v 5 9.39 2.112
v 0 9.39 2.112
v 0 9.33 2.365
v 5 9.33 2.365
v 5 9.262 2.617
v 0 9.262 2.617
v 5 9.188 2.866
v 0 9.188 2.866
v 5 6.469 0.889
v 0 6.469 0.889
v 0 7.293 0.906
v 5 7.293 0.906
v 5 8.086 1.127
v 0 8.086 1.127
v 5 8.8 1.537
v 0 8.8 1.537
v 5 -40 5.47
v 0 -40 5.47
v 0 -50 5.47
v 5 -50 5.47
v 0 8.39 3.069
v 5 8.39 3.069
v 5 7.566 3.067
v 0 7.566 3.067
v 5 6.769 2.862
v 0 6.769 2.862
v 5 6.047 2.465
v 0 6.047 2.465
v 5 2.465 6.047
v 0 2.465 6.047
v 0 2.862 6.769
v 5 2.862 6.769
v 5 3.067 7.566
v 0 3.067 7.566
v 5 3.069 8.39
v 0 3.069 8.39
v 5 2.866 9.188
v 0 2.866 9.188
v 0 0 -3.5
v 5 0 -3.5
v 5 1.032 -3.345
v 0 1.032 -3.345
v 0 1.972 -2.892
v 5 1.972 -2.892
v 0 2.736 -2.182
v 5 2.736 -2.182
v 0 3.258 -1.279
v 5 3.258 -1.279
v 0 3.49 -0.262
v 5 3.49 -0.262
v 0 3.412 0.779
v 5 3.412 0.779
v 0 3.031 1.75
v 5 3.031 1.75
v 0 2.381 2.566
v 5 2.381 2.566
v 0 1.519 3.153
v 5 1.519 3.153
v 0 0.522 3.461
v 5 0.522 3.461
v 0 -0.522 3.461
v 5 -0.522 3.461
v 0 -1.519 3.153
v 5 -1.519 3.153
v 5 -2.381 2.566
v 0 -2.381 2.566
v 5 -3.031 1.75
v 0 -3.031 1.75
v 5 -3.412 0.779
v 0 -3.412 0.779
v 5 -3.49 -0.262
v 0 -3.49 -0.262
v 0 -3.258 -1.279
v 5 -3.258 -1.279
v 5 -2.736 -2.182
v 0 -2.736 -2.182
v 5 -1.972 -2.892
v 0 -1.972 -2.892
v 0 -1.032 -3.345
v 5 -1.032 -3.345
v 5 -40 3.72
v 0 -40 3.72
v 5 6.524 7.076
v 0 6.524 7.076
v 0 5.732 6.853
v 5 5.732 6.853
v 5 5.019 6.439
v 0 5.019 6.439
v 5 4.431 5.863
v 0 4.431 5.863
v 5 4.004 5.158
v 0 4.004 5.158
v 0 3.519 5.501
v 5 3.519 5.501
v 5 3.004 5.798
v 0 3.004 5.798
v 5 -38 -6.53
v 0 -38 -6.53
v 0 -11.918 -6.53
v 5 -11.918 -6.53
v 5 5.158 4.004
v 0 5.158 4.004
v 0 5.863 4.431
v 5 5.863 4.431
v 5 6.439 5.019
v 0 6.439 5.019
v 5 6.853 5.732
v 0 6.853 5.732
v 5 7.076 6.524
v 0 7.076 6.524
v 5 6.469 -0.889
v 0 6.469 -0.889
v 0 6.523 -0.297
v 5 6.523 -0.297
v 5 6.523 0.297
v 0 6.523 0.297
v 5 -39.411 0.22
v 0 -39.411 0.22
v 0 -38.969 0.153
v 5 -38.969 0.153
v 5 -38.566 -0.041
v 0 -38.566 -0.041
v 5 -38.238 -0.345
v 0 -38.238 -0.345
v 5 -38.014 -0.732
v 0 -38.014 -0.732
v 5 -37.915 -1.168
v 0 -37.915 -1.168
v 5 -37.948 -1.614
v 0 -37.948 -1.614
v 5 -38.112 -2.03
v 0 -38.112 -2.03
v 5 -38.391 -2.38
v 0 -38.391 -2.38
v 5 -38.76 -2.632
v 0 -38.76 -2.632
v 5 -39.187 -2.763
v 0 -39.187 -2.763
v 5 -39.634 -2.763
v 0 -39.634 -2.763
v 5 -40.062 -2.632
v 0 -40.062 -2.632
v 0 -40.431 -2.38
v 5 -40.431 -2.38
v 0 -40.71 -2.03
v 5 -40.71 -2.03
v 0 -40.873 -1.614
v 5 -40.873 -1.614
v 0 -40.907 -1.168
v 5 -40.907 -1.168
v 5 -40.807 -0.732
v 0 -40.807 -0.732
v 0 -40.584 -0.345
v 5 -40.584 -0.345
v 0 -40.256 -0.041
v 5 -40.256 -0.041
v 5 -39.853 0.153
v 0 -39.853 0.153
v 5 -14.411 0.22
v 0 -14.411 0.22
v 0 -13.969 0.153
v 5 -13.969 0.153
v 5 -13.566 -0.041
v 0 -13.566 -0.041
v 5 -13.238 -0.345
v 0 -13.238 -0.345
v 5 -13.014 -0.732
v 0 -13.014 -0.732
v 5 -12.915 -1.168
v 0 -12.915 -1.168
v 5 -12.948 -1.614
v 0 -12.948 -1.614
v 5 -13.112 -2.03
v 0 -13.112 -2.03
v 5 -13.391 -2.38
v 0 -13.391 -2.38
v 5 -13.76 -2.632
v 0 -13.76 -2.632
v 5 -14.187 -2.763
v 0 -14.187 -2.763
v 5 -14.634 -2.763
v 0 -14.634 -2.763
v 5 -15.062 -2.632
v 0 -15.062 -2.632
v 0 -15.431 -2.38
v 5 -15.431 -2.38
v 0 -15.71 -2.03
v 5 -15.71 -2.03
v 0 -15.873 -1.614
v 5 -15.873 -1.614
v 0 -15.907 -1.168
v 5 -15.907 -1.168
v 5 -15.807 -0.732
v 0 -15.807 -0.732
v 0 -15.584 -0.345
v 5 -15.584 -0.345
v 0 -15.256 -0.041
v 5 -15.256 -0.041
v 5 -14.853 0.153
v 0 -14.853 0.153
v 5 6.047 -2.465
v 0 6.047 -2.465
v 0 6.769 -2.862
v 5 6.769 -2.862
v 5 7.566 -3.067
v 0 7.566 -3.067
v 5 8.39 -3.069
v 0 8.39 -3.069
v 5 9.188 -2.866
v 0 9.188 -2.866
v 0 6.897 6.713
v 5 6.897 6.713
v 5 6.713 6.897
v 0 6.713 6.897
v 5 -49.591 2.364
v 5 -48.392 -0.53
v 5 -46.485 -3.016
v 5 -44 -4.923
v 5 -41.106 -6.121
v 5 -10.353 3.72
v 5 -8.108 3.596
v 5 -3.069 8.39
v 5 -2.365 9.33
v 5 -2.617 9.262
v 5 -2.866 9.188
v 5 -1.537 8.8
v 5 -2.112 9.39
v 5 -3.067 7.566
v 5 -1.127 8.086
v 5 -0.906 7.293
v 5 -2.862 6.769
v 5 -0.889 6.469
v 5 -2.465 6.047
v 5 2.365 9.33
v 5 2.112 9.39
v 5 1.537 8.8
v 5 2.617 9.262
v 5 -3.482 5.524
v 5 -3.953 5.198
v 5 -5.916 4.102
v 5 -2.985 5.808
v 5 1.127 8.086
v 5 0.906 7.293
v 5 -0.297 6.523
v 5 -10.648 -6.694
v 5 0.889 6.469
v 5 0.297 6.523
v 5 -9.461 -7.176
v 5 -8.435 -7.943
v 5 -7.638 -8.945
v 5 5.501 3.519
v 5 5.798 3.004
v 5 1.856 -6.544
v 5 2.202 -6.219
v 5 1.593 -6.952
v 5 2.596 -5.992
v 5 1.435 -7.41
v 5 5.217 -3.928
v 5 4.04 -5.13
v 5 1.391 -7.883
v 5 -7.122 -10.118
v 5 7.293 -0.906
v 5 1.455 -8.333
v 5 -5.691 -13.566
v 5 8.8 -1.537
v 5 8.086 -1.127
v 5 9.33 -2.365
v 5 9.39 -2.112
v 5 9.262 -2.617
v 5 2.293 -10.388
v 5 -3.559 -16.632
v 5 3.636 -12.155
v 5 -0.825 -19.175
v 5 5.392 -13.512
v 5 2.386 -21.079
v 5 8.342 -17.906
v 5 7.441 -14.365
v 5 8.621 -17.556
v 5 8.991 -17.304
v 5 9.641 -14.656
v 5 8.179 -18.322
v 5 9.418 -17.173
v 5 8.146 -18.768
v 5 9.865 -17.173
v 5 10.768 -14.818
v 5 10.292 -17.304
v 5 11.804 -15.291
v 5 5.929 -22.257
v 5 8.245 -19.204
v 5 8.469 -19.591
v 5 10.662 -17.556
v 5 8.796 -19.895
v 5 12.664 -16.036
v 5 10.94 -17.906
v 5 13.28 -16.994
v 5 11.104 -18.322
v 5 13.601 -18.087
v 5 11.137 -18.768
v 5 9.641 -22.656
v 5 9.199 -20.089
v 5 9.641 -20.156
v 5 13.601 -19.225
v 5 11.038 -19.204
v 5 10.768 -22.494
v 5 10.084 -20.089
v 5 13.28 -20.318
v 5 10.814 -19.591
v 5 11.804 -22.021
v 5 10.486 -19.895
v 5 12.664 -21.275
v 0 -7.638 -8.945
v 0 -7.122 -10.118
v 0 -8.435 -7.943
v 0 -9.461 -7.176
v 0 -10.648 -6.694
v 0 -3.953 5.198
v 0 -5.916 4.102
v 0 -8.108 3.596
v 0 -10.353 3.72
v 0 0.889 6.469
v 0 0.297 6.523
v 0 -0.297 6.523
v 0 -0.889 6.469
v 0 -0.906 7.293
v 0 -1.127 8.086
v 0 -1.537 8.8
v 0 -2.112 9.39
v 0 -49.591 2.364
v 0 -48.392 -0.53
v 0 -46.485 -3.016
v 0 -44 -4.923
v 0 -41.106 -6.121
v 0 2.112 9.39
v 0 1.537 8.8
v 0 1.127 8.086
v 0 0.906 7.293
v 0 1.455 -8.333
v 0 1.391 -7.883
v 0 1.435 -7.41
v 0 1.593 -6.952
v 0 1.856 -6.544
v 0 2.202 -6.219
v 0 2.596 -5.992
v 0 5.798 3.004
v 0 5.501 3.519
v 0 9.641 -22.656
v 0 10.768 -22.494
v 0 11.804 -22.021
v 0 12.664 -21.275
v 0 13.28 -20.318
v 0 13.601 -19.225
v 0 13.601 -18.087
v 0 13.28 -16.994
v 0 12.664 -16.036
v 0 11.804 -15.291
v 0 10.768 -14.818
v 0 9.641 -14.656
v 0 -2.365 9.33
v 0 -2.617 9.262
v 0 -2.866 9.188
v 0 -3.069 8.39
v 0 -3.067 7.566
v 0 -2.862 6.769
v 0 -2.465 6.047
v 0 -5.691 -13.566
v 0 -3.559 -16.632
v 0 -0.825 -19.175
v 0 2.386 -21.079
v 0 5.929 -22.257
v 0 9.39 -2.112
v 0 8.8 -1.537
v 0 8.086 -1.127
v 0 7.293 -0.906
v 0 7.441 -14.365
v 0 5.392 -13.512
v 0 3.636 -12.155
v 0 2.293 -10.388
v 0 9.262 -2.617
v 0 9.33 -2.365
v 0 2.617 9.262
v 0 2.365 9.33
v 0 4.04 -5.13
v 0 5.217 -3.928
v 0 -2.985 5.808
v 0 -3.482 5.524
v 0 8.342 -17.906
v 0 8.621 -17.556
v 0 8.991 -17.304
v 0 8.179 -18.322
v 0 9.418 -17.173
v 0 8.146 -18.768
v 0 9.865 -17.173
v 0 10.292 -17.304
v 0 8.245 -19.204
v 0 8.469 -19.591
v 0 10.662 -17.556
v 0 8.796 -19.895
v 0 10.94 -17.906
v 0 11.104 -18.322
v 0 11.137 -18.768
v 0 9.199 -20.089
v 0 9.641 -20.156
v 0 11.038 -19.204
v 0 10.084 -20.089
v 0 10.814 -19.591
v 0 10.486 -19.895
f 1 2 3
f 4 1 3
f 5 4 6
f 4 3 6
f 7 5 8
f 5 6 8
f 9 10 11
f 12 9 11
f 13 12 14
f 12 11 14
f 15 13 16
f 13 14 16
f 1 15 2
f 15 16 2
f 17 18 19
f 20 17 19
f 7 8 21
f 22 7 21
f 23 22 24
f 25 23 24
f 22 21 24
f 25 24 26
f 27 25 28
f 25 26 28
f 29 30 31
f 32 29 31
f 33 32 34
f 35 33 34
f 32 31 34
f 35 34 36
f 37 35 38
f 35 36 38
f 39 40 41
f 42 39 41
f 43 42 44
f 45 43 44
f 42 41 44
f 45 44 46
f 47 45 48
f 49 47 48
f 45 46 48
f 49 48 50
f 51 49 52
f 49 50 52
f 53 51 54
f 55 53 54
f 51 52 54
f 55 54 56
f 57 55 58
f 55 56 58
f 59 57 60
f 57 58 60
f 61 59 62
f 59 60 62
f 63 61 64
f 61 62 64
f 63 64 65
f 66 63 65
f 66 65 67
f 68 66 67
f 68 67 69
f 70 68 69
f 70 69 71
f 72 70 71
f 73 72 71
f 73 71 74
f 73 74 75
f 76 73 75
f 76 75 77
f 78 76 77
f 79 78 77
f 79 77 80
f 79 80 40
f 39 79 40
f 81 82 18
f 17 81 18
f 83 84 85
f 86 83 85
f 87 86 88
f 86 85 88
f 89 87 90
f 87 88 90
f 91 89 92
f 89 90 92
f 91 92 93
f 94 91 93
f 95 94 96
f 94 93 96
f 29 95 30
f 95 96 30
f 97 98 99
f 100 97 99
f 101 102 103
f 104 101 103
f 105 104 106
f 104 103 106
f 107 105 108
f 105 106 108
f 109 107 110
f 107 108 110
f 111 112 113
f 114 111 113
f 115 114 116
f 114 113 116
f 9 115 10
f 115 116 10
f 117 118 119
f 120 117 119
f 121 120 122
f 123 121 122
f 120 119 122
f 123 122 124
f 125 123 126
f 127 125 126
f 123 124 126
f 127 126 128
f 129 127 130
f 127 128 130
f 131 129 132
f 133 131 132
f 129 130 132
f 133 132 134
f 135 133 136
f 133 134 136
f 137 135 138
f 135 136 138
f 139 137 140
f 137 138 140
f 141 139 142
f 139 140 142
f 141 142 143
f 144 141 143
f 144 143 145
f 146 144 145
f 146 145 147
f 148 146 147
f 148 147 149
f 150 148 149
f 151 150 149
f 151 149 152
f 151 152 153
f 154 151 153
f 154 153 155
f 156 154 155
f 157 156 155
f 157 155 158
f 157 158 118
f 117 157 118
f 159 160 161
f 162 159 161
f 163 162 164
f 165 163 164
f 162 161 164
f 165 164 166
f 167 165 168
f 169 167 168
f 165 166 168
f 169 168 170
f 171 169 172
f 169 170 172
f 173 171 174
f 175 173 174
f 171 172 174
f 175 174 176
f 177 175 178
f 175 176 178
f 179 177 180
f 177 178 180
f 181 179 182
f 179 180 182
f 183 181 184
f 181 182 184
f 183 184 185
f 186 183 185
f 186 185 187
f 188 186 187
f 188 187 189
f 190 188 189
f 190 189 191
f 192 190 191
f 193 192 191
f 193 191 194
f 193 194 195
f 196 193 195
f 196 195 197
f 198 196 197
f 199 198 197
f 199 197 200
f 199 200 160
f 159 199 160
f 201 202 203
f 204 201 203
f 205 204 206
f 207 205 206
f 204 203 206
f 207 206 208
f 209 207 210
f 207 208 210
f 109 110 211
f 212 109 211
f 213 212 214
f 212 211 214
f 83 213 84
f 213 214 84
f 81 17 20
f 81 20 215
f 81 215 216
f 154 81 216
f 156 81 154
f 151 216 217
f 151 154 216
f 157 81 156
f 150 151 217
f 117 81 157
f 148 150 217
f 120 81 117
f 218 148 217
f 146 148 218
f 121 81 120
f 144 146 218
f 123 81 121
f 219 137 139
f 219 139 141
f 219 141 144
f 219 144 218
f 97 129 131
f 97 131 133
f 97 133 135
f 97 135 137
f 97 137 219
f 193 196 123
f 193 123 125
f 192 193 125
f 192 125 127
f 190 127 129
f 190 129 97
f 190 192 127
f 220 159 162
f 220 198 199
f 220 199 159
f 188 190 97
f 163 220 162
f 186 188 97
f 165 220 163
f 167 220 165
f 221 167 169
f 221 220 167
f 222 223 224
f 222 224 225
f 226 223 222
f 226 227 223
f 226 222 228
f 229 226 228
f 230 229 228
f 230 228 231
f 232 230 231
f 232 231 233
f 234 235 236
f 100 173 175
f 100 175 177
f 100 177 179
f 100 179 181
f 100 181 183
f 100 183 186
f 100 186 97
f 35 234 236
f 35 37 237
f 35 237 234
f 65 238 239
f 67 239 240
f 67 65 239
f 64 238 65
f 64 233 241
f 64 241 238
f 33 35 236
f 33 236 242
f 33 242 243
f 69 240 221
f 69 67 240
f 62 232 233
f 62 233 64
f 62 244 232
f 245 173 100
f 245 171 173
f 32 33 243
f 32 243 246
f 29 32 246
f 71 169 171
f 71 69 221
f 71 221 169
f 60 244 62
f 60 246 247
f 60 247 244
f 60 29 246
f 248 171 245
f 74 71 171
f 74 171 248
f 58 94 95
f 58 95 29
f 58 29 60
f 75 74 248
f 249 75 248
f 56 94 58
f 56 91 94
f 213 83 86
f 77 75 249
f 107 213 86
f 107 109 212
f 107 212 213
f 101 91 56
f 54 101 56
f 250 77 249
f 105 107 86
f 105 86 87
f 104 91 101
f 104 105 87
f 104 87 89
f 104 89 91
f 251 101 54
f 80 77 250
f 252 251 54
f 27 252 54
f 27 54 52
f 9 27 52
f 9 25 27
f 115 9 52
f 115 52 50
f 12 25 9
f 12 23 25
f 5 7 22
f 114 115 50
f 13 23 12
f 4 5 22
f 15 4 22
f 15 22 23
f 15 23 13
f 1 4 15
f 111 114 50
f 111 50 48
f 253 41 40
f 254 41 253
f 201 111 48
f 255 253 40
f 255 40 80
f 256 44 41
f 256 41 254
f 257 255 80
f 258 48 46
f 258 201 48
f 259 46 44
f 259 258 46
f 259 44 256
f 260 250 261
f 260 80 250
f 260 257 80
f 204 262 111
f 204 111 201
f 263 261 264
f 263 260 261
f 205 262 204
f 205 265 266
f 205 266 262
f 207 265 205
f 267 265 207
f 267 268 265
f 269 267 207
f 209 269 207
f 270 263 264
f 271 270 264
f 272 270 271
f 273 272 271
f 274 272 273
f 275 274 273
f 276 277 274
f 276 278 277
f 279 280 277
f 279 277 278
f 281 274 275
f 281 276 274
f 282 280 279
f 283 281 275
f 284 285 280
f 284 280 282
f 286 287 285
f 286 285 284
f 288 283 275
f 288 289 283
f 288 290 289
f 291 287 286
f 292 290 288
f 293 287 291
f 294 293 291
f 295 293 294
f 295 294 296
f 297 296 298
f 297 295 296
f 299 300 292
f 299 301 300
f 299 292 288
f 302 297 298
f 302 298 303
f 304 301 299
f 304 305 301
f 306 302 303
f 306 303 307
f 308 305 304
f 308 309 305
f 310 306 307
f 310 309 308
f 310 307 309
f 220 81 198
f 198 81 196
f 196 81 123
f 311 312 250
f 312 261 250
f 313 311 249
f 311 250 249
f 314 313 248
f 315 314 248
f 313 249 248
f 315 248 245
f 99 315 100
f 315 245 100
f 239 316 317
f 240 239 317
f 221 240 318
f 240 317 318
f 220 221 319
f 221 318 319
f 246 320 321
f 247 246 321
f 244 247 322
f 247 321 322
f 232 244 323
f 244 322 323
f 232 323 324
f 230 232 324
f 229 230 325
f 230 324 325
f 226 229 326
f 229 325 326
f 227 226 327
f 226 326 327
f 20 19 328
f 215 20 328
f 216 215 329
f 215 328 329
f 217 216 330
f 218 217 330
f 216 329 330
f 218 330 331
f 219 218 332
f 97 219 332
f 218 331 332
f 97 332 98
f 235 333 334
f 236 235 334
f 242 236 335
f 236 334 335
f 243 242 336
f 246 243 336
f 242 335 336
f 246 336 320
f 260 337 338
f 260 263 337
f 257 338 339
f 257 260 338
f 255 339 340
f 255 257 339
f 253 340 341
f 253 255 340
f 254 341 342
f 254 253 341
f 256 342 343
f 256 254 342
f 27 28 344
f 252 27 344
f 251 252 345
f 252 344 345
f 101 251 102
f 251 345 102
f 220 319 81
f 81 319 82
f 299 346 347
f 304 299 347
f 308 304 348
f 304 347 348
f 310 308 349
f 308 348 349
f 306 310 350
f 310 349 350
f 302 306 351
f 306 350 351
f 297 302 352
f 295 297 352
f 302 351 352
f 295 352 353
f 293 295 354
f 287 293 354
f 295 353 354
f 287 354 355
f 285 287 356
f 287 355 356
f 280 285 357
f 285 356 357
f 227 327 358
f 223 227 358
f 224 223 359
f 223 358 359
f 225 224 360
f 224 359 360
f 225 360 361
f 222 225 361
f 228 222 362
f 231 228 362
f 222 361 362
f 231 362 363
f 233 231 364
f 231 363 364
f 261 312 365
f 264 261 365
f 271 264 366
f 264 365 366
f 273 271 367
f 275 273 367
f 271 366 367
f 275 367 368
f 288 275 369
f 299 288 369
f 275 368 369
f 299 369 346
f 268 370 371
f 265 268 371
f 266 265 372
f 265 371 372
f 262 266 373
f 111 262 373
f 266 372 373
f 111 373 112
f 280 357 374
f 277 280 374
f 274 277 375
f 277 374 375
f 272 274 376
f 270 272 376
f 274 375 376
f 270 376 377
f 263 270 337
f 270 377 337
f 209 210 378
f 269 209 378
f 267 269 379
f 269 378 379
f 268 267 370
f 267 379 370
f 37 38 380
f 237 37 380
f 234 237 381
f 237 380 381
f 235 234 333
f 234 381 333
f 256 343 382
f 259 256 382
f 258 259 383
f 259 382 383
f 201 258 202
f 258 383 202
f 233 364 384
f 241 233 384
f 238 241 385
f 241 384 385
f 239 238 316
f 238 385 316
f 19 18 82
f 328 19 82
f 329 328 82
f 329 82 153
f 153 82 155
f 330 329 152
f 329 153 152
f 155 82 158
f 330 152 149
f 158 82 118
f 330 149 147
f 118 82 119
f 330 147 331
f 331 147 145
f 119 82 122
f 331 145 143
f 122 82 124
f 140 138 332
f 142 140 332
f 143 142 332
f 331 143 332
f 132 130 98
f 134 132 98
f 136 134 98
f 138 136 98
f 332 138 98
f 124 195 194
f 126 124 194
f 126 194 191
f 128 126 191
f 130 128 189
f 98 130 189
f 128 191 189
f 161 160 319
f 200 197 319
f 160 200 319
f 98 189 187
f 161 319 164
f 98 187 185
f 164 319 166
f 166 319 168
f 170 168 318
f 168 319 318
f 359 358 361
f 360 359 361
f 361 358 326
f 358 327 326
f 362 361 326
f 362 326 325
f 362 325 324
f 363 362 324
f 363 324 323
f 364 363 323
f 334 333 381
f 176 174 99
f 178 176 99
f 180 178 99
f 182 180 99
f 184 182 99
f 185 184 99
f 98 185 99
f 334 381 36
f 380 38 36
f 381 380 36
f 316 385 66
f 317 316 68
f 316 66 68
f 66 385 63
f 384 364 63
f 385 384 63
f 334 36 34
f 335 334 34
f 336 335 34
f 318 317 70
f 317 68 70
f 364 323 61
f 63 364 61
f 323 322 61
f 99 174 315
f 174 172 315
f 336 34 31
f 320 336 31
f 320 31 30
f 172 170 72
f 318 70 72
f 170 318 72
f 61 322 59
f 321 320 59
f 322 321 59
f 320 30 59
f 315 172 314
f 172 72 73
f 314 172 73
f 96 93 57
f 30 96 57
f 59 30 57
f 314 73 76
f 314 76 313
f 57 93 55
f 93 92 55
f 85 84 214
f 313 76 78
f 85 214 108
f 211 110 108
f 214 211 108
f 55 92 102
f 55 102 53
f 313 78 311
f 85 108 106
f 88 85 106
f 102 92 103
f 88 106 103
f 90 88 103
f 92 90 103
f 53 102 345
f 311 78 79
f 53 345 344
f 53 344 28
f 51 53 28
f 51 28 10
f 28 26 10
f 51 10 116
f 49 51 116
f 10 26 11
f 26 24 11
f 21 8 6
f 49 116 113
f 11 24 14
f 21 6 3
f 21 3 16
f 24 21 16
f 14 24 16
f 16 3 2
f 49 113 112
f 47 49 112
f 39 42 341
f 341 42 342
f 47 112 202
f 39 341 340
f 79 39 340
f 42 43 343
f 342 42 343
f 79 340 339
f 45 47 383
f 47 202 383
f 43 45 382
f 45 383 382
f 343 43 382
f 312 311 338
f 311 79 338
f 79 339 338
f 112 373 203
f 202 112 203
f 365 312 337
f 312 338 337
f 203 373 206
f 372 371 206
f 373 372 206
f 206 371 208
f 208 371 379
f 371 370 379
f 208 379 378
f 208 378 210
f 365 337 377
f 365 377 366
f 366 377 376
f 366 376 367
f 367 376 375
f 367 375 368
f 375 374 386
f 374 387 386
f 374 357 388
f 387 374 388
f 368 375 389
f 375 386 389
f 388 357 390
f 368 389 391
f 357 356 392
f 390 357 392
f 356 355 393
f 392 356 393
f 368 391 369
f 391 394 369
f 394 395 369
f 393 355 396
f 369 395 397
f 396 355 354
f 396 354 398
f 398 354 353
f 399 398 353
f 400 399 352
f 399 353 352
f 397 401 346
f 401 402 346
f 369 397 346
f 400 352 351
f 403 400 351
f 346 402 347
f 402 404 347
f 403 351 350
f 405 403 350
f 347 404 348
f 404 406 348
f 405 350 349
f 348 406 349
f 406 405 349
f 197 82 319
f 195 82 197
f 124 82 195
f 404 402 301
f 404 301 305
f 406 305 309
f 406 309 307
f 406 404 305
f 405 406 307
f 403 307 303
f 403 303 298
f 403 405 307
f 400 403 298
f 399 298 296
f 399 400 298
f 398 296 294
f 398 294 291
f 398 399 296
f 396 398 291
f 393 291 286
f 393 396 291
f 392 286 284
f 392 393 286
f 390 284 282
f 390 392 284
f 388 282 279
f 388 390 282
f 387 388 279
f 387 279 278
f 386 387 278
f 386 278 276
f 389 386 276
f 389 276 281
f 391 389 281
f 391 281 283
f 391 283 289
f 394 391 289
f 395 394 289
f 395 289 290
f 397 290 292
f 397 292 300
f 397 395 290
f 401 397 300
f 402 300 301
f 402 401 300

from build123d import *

# Parameters (mm, degrees)
CUT_EXTRUDE2_START     = -5
CUT_EXTRUDE2_OUTLINE_R = 3
CUT_EXTRUDE2_DEPTH     = 5
BOSS_EXTRUDE1_START    = -5
BOSS_EXTRUDE1_DEPTH    = 5
BOSS_EXTRUDE2_START    = -5
SKETCH3_R              = 1.5
BOSS_EXTRUDE2_DEPTH    = 5
FILLET1_R              = 2
FILLET2_R              = 5
SKETCH4_R              = 3.5
CUT_EXTRUDE3_DEPTH     = 10
SKETCH5_R              = 1.5
CUT_EXTRUDE4_DEPTH     = 56.120690806


with BuildPart() as part:
    # Cut-Extrude2: read off the stored shape, not the designer's step
    # Cut-Extrude2 outline → Cut-Extrude2 (new body)
    with BuildSketch(Plane(origin=(5, 0, 0), x_dir=(0, 0, -1), z_dir=(1, 0, 0)).offset(CUT_EXTRUDE2_START)):
        with BuildLine():
            ThreePointArc((-6.52418924, 7.07641009), (-6.805902769, 6.805902769), (-7.07641009, 6.52418924))
            ThreePointArc((-7.07641009, 6.52418924), (-6.439370402, 5.019214625), (-5.158353358, 4.004441996))
            ThreePointArc((-5.158353358, 4.004441996), (-5.655362393, 3.265125), (-6.047125175, 2.465044051))
            ThreePointArc((-6.047125175, 2.465044051), (-7.566452573, 3.06705104), (-9.188318666, 2.866256285))
            ThreePointArc((-9.188318666, 2.866256285), (-9.297036078, 2.491133309), (-9.390445525, 2.111908577))
            ThreePointArc((-9.390445525, 2.111908577), (-8.086265665, 1.127082171), (-6.469486047, 0.888771818))
            ThreePointArc((-6.469486047, 0.888771818), (-6.53025, 0), (-6.469486047, -0.888771818))
            ThreePointArc((-6.469486047, -0.888771818), (-8.086265665, -1.127082171), (-9.390445525, -2.111908577))
            ThreePointArc((-9.390445525, -2.111908577), (-9.297036078, -2.491133309), (-9.188318666, -2.866256285))
            ThreePointArc((-9.188318666, -2.866256285), (-7.566452573, -3.06705104), (-6.047125175, -2.465044051))
            ThreePointArc((-6.047125175, -2.465044051), (4.617584058, -4.617584058), (2.465044051, 6.047125175))
            ThreePointArc((2.465044051, 6.047125175), (3.06705104, 7.566452573), (2.866256285, 9.188318666))
            ThreePointArc((2.866256285, 9.188318666), (2.491133309, 9.297036078), (2.111908577, 9.390445525))
            ThreePointArc((2.111908577, 9.390445525), (1.127082171, 8.086265665), (0.888771818, 6.469486047))
            ThreePointArc((0.888771818, 6.469486047), (0, 6.53025), (-0.888771818, 6.469486047))
            ThreePointArc((-0.888771818, 6.469486047), (-1.127082171, 8.086265665), (-2.111908577, 9.390445525))
            ThreePointArc((-2.111908577, 9.390445525), (-2.491133309, 9.297036078), (-2.866256285, 9.188318666))
            ThreePointArc((-2.866256285, 9.188318666), (-3.06705104, 7.566452573), (-2.465044051, 6.047125175))
            ThreePointArc((-2.465044051, 6.047125175), (-3.265125, 5.655362393), (-4.004441996, 5.158353358))
            ThreePointArc((-4.004441996, 5.158353358), (-5.019214625, 6.439370402), (-6.52418924, 7.07641009))
        make_face()
        Circle(CUT_EXTRUDE2_OUTLINE_R, mode=Mode.SUBTRACT)
    extrude(amount=CUT_EXTRUDE2_DEPTH)

    # Sketch2 → Boss-Extrude1 (add)
    with BuildSketch(Plane(origin=(5, 0, 0), x_dir=(0, 0, -1), z_dir=(1, 0, 0)).offset(BOSS_EXTRUDE1_START)):
        with BuildLine():
            Line((-3.71975, -10.353236172), (-3.71975, -40))
            Line((-3.71975, -40), (-5.46975, -40))
            Line((-5.46975, -40), (-5.46975, -50))
            ThreePointArc((-5.46975, -50), (3.015531374, -46.485281374), (6.53025, -38))
            Line((6.53025, -38), (6.53025, 0))
            ThreePointArc((6.53025, 0), (2.085463632, -6.188295929), (-5.198246307, -3.952518235))
            ThreePointArc((-5.198246307, -3.952518235), (-3.771697436, -6.994118204), (-3.71975, -10.353236172))
        make_face()
    extrude(amount=BOSS_EXTRUDE1_DEPTH)

    # Sketch3 → Boss-Extrude2 (add)
    with BuildSketch(Plane(origin=(5, 0, 0), x_dir=(0, 0, -1), z_dir=(1, 0, 0)).offset(BOSS_EXTRUDE2_START)):
        with BuildLine():
            Line((6.53025, 0), (6.53025, -7.78173689))
            ThreePointArc((6.53025, -7.78173689), (18.005815569, -2.228753726), (22.655916213, 9.64141018))
            ThreePointArc((22.655916213, 9.64141018), (18.655916213, 13.64141018), (14.655916213, 9.64141018))
            ThreePointArc((14.655916213, 9.64141018), (12.257472566, 3.739621168), (6.422011938, 1.184030293))
            ThreePointArc((6.422011938, 1.184030293), (6.503134187, 0.594483644), (6.53025, 0))
        make_face()
        with Locations((18.655916213, 9.64141018)):
            Circle(SKETCH3_R, mode=Mode.SUBTRACT)
    extrude(amount=BOSS_EXTRUDE2_DEPTH)

    # Fillet1
    fillet1_edges = [part.edges().sort_by_distance(p)[0] for p in [
        (2.5, 1.184030293, -6.422011938),
    ]]
    fillet(fillet1_edges, radius=FILLET1_R)

    # Fillet2
    fillet2_edges = [part.edges().sort_by_distance(p)[0] for p in [
        (2.5, -7.78173689, -6.53025),
    ]]
    fillet(fillet2_edges, radius=FILLET2_R)

    # Sketch4 → Cut-Extrude3 (cut)
    with BuildSketch(Plane(origin=(5, 0, 0), x_dir=(0, 0, -1), z_dir=(1, 0, 0))):
        Circle(SKETCH4_R)
    extrude(amount=-CUT_EXTRUDE3_DEPTH, mode=Mode.SUBTRACT)

    # Sketch5 → Cut-Extrude4 (cut, through all)
    with BuildSketch(Plane.ZY):
        with Locations((-1.28025, -14.410797367)):
            Circle(SKETCH5_R)
        with Locations((-1.28025, -39.410797367)):
            Circle(SKETCH5_R)
    extrude(amount=-CUT_EXTRUDE4_DEPTH, mode=Mode.SUBTRACT)


solid = part.part
